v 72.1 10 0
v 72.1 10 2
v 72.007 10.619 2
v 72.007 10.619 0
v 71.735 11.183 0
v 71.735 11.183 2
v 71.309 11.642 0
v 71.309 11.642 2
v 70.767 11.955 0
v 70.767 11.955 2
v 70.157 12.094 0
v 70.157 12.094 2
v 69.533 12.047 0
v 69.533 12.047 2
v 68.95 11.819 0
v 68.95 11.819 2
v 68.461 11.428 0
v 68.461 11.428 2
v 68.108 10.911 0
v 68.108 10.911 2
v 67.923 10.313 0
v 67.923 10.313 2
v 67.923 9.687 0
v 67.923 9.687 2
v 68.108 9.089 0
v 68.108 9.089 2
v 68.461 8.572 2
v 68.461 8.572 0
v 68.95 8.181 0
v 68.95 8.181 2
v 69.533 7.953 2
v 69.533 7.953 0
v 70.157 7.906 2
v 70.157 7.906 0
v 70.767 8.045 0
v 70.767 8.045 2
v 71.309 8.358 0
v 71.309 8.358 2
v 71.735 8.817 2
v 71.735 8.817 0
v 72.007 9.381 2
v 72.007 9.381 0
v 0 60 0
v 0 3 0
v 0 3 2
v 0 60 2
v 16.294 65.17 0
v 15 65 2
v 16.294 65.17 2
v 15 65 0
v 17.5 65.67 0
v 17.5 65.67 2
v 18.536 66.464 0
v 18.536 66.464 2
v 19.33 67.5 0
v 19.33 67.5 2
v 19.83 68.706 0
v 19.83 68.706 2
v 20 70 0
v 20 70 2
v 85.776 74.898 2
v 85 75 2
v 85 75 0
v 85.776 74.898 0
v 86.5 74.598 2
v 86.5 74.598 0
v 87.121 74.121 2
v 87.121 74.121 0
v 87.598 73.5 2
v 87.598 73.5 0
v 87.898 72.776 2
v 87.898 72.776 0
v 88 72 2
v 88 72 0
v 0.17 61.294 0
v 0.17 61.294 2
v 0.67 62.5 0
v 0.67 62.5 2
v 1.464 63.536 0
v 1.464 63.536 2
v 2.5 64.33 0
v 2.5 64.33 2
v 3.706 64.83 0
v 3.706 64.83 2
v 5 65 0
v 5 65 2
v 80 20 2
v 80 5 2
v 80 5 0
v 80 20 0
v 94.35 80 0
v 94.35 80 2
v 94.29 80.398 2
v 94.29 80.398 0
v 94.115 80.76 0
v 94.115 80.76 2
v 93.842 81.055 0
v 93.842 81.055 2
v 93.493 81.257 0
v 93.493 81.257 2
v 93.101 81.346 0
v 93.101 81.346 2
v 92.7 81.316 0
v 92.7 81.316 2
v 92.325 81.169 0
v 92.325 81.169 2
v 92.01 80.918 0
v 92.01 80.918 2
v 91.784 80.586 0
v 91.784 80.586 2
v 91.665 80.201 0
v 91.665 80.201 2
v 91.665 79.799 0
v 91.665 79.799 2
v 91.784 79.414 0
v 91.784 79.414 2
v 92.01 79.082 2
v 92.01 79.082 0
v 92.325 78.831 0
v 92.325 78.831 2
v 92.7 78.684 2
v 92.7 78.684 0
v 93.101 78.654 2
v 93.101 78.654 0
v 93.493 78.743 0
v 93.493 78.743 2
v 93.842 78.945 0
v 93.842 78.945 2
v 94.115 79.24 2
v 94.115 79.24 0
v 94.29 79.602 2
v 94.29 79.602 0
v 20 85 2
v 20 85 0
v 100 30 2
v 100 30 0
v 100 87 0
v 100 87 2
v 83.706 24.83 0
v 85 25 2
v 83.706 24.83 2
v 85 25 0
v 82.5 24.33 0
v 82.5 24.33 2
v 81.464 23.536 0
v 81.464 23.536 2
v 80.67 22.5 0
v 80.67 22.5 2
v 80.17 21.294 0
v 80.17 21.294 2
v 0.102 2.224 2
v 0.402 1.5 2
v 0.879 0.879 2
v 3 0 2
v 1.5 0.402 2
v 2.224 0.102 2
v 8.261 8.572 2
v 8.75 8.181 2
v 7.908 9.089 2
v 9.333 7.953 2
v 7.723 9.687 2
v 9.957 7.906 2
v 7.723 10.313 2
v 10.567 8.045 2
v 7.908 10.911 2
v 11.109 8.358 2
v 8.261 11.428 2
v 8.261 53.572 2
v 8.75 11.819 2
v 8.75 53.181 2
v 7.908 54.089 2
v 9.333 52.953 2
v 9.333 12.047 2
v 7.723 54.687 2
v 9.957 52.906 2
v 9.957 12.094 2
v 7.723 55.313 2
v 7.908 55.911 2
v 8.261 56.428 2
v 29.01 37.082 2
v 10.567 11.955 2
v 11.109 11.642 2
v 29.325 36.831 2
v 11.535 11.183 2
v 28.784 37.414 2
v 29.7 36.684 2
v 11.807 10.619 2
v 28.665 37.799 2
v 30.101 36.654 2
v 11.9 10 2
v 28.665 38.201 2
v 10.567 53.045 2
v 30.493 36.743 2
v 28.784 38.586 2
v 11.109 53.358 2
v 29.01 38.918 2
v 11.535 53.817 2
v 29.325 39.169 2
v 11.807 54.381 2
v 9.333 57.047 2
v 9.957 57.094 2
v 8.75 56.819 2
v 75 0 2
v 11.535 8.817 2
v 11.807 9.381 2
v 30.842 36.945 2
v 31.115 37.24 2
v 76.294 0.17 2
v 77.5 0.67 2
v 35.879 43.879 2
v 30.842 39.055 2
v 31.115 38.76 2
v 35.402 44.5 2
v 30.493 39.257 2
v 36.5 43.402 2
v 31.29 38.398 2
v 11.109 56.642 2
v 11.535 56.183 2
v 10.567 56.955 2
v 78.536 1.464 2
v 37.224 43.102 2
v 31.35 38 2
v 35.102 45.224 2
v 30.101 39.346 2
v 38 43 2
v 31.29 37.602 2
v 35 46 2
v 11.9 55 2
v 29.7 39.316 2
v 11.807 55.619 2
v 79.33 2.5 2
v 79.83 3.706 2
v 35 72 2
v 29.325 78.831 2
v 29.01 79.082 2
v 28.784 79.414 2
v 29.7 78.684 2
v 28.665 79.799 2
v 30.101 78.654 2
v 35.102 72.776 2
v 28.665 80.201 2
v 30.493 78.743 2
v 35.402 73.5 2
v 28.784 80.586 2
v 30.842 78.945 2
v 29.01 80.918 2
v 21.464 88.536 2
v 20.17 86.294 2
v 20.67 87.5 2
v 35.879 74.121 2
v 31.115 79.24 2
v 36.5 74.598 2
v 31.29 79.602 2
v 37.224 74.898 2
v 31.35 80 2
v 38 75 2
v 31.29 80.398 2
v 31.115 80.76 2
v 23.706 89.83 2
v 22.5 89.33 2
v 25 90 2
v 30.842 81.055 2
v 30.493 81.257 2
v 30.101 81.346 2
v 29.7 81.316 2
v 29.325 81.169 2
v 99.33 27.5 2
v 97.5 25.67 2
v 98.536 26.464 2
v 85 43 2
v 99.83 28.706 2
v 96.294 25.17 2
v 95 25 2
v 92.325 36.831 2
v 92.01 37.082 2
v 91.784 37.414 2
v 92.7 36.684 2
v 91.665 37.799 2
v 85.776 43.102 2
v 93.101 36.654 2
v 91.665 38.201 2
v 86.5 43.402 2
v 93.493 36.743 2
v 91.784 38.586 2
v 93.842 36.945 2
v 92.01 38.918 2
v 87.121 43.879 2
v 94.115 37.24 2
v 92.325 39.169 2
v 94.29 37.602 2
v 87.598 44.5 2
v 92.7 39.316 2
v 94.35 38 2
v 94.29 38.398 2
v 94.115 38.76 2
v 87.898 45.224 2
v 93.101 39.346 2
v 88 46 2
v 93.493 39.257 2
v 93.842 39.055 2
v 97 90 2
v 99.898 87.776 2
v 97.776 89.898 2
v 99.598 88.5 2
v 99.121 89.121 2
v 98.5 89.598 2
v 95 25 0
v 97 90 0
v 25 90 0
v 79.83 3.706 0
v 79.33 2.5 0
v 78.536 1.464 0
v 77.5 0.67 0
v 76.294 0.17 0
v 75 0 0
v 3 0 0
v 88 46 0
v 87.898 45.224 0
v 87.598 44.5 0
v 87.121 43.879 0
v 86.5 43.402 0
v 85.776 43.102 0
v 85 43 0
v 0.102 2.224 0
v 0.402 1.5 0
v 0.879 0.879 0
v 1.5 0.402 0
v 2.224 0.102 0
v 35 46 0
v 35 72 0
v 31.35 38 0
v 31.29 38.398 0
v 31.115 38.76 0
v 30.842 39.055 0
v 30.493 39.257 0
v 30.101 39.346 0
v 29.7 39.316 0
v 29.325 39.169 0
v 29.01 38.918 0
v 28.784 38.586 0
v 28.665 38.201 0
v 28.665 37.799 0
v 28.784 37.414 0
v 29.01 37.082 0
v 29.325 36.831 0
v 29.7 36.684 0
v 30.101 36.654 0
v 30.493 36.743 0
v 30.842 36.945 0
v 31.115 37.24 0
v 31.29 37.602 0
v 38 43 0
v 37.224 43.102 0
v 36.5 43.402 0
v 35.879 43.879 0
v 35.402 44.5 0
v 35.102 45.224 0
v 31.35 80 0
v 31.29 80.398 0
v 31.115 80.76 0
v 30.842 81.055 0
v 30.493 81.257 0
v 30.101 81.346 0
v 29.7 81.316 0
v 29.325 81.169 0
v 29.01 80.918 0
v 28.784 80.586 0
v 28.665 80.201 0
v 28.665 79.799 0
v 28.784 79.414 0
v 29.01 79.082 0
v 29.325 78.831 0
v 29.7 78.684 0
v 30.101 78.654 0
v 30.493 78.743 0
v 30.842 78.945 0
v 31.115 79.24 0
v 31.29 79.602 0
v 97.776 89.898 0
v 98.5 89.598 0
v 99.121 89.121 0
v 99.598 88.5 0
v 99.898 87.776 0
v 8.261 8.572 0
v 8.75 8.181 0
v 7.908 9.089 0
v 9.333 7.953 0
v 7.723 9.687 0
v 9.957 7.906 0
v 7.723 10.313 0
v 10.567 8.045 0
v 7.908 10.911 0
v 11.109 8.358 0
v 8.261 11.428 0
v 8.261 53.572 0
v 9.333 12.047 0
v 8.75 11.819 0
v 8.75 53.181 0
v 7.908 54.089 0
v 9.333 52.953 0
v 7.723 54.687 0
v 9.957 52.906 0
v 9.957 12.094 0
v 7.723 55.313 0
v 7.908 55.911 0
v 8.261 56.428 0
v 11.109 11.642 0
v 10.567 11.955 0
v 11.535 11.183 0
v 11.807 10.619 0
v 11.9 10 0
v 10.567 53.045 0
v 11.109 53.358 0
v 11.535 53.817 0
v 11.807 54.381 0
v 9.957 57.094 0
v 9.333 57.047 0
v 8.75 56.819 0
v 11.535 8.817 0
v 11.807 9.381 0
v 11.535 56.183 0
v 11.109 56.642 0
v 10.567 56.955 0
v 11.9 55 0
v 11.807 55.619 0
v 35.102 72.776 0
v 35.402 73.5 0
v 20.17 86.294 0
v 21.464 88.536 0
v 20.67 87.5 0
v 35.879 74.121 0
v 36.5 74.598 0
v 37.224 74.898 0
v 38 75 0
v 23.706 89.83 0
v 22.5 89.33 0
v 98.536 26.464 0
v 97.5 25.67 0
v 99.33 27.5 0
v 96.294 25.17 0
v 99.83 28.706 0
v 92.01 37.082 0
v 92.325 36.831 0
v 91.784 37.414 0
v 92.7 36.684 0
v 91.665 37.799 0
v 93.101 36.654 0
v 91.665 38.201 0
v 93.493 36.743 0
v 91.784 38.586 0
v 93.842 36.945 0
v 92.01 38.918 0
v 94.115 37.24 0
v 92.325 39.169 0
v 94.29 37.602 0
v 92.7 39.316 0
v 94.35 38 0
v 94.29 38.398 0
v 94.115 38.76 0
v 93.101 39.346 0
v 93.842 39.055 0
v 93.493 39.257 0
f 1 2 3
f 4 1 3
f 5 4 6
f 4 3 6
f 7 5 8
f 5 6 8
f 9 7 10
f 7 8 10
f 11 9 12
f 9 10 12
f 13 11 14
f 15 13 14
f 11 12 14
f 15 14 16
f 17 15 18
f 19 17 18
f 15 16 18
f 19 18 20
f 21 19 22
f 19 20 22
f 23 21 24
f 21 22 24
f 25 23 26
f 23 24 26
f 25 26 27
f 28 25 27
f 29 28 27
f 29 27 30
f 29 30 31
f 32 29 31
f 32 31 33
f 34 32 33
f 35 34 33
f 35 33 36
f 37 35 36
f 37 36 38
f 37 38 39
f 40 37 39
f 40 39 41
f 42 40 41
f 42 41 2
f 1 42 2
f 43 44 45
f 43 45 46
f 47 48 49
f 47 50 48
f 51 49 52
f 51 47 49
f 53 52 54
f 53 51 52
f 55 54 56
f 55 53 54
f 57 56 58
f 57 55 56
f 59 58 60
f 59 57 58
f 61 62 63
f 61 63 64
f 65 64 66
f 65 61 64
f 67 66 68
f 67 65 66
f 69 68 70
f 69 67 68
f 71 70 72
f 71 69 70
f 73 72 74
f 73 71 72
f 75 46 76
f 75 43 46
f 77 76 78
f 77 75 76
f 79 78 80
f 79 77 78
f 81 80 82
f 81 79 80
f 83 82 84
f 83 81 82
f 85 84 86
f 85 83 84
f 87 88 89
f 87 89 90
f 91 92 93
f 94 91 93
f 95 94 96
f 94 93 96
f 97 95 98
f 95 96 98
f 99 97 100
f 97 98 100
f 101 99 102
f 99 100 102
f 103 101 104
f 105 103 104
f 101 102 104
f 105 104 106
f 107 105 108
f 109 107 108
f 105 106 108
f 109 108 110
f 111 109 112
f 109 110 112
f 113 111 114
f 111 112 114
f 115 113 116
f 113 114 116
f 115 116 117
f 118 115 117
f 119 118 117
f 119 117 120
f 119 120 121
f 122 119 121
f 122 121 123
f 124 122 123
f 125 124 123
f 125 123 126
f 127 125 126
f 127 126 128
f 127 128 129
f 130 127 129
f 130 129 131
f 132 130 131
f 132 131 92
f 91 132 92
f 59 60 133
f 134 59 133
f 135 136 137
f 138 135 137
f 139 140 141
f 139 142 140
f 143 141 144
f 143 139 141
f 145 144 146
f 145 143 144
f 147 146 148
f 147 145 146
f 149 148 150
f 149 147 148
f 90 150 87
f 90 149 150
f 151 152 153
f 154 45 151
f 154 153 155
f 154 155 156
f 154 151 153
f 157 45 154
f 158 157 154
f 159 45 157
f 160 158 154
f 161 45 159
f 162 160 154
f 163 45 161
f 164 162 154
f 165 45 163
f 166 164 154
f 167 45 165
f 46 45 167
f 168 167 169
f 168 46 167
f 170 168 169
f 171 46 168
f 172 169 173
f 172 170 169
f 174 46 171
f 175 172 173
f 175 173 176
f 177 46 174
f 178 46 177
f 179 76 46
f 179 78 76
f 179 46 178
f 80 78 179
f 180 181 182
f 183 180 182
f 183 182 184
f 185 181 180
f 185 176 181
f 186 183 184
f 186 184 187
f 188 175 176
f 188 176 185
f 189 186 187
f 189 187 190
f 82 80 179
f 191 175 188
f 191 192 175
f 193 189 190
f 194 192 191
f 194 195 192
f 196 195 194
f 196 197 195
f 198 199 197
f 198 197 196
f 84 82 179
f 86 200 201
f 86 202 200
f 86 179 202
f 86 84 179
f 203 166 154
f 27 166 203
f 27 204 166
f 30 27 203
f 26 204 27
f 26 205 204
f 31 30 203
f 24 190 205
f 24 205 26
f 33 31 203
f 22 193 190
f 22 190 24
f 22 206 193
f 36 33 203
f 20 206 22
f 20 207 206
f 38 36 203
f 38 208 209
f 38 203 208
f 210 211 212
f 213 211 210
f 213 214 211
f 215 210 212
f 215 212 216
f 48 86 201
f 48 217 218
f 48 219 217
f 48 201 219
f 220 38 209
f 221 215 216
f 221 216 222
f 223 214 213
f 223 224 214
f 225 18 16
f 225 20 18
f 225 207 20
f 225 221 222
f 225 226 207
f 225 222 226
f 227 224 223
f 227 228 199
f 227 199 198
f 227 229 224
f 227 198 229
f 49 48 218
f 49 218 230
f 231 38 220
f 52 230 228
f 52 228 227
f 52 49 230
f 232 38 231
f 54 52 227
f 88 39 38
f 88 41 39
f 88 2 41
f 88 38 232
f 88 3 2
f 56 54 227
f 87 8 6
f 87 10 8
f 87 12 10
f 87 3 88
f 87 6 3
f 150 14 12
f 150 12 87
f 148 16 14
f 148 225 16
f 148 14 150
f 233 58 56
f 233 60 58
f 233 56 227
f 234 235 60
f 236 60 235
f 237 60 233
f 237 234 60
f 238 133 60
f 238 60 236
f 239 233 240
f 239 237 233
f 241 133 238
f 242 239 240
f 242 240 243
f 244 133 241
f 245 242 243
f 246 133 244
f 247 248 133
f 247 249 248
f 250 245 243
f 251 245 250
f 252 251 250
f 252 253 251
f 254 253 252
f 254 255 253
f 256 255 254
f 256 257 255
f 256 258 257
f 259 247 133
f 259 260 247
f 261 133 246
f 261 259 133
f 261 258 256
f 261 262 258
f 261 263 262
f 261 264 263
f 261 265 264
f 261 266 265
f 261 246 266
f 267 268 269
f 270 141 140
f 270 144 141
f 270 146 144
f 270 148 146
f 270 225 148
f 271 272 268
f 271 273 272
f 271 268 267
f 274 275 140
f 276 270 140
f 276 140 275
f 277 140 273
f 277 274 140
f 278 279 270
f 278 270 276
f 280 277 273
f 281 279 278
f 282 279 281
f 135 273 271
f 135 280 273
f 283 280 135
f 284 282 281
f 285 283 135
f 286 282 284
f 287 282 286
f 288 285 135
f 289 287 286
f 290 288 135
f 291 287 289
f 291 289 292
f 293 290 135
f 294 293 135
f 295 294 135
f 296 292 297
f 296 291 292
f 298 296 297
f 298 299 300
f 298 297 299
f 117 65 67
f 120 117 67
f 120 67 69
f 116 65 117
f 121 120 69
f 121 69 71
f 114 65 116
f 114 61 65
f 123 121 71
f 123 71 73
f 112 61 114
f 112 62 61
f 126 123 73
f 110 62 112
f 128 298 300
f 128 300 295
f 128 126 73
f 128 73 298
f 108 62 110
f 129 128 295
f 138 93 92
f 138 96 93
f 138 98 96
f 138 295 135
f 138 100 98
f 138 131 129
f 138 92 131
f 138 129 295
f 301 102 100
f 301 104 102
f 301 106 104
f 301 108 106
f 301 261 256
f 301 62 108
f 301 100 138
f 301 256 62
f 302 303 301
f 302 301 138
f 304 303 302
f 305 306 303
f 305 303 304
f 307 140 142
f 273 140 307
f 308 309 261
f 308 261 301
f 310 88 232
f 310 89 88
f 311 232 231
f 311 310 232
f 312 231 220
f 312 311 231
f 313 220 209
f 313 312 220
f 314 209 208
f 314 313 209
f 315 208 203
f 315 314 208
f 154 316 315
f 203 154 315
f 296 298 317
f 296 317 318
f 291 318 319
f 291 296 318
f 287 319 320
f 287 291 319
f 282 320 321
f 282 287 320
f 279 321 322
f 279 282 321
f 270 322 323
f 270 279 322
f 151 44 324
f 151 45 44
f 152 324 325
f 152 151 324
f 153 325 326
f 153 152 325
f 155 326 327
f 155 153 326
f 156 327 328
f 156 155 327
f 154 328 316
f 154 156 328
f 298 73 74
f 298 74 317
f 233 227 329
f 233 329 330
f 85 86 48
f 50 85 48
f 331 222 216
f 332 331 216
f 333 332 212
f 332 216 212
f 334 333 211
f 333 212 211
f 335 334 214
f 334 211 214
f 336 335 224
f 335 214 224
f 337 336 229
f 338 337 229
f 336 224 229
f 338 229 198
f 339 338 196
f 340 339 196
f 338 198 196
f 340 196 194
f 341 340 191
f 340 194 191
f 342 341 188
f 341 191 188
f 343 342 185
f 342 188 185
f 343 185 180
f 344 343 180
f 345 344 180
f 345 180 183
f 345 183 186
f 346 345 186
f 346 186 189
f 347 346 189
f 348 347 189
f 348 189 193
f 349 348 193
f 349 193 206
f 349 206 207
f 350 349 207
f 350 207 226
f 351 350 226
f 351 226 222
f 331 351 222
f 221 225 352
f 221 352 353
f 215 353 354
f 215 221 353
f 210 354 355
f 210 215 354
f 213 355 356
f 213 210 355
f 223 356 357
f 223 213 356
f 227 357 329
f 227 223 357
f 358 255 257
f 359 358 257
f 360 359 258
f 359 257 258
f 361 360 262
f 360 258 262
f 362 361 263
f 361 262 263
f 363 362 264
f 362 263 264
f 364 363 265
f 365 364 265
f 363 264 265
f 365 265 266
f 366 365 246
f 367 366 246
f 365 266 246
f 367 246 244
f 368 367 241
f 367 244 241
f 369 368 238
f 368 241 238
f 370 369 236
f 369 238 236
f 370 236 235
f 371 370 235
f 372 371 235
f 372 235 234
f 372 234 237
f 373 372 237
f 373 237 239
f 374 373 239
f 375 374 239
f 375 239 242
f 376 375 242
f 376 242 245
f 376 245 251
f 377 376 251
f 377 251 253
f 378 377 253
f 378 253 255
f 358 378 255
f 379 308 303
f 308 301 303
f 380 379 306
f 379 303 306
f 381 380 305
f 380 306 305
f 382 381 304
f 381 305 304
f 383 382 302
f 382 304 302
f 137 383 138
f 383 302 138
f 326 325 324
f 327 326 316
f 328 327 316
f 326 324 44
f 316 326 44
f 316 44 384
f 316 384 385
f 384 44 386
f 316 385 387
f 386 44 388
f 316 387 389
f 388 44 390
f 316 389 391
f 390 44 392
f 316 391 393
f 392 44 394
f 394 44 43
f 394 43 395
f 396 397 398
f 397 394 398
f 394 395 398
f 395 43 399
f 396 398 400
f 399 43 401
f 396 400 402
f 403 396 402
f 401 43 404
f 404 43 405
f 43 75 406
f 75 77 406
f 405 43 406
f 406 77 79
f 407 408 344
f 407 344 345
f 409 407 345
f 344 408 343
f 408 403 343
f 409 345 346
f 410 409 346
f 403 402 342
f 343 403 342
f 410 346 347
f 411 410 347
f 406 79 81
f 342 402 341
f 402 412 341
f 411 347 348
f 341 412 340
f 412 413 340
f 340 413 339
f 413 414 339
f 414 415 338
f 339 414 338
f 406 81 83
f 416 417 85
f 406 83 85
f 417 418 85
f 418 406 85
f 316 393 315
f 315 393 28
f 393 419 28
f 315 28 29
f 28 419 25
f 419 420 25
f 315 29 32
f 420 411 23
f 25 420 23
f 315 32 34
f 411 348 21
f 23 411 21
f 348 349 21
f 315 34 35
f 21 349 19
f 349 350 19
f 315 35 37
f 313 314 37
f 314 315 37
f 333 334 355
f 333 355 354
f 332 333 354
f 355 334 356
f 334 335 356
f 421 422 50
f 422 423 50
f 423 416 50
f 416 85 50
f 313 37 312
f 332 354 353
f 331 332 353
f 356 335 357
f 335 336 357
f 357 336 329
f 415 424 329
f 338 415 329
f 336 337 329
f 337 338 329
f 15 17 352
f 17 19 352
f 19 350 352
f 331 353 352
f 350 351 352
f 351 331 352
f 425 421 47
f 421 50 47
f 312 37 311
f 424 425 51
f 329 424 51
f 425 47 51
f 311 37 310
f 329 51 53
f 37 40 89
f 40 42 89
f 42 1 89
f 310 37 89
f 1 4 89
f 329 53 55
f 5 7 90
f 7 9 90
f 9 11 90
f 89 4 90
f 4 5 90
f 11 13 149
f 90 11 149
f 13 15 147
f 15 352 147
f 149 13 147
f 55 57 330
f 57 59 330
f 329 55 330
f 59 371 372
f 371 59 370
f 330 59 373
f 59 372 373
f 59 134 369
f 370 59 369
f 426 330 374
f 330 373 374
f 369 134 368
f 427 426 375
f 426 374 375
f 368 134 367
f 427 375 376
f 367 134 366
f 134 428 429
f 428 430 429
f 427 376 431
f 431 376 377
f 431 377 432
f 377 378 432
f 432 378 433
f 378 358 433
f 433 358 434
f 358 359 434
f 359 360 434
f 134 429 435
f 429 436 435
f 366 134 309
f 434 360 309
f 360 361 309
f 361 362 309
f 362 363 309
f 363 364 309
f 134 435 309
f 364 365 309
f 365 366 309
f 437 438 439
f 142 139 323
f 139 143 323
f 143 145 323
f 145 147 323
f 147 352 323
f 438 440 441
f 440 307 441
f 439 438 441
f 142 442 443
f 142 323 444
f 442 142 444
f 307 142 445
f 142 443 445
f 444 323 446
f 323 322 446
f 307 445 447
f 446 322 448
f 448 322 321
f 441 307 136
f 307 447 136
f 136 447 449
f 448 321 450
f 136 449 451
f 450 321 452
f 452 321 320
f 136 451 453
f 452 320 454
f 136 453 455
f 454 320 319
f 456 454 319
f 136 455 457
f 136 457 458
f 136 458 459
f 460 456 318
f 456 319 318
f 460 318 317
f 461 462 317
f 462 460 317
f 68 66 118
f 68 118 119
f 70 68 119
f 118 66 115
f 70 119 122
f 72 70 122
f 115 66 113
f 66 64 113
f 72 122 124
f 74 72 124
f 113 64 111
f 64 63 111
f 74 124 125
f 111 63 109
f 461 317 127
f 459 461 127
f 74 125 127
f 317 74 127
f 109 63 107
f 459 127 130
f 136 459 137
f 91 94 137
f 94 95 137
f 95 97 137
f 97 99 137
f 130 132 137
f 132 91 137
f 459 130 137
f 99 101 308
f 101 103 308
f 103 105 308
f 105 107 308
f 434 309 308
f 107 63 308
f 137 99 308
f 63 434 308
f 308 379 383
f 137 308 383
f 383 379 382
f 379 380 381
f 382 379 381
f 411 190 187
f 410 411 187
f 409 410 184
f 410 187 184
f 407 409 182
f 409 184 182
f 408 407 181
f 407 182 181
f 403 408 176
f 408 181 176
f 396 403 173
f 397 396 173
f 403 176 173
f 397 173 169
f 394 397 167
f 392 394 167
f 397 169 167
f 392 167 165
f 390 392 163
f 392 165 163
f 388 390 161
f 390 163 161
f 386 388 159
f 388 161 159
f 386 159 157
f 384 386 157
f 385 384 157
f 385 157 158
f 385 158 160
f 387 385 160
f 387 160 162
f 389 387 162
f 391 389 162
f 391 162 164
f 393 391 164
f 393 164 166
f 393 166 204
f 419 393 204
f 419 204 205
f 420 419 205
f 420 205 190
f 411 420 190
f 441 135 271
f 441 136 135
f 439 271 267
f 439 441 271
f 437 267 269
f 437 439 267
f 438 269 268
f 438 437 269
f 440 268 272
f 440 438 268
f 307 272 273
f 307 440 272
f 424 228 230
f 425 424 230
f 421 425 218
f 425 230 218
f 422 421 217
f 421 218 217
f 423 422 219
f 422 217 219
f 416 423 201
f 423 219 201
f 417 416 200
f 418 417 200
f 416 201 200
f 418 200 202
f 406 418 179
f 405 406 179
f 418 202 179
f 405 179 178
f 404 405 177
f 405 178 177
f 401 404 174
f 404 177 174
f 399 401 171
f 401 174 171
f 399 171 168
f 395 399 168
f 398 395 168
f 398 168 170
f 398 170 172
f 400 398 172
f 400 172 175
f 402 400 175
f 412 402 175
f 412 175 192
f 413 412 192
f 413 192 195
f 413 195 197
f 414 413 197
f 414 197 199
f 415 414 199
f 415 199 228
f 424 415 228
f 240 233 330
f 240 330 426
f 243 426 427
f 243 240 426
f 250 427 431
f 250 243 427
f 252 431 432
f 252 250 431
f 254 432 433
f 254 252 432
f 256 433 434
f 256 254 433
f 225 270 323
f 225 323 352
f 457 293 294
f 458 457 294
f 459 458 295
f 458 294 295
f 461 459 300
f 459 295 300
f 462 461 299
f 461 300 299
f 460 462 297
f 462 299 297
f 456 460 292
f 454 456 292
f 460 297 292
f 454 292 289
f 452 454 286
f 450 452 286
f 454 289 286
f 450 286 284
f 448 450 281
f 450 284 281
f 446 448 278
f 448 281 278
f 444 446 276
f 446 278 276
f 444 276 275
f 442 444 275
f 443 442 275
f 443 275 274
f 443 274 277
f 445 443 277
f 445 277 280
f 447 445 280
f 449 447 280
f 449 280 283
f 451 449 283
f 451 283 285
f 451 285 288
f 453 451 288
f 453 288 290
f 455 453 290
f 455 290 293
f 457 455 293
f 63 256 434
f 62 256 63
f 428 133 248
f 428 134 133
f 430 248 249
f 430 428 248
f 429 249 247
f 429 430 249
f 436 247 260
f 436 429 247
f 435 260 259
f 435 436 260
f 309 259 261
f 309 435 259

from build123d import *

# Parameters (mm, degrees)
SKETCH_1_W          = 100
SKETCH_1_H          = 90
EXTRUDE_1_DEPTH     = 2
SKETCH_2_R          = 2.1
CUT_EXTRUDE_1_DEPTH = 135.551105532
SKETCH_3_R          = 1.35
CUT_EXTRUDE_2_DEPTH = 135.551105532
FILLET_1_R          = 3
SKETCH_5_W          = 20
SKETCH_5_H          = 25
CUT_EXTRUDE_3_DEPTH = 10
FILLET_2_R          = 5


with BuildPart() as part:
    # 草图1 → 凸台-拉伸1 (new body)
    with BuildSketch(Plane.XY):
        with Locations((50, 45)):
            Rectangle(SKETCH_1_W, SKETCH_1_H)
    extrude(amount=EXTRUDE_1_DEPTH)

    # 草图2 → 切除-拉伸1 (cut, through all)
    with BuildSketch(Plane.XY.offset(2)):
        with Locations((9.8, 10)):
            Circle(SKETCH_2_R)
        with Locations((70, 10)):
            Circle(SKETCH_2_R)
        with Locations((9.8, 55)):
            Circle(SKETCH_2_R)
    extrude(amount=-CUT_EXTRUDE_1_DEPTH, mode=Mode.SUBTRACT)

    # 草图3 → 切除-拉伸2 (cut, through all)
    with BuildSketch(Plane.XY.offset(2)):
        with Locations((30, 80)):
            Circle(SKETCH_3_R)
        with Locations((93, 80)):
            Circle(SKETCH_3_R)
        with Locations((93, 38)):
            Circle(SKETCH_3_R)
        with Locations((30, 38)):
            Circle(SKETCH_3_R)
        with BuildLine():
            Line((38, 75), (85, 75))
            ThreePointArc((85, 75), (87.121320344, 74.121320344), (88, 72))
            Line((88, 72), (88, 46))
            ThreePointArc((88, 46), (87.121320344, 43.878679656), (85, 43))
            Line((85, 43), (38, 43))
            ThreePointArc((38, 43), (35.878679656, 43.878679656), (35, 46))
            Line((35, 46), (35, 72))
            ThreePointArc((35, 72), (35.878679656, 74.121320344), (38, 75))
        make_face()
    extrude(amount=-CUT_EXTRUDE_2_DEPTH, mode=Mode.SUBTRACT)

    # 圆角1
    fillet_1_edges = [part.edges().sort_by_distance(p)[0] for p in [
        (0, 90, 1),
        (100, 90, 1),
        (100, 0, 1),
        (0, 0, 1),
    ]]
    fillet(fillet_1_edges, radius=FILLET_1_R)

    # 草图5 → 切除-拉伸3 (cut)
    with BuildSketch(Plane.XY.offset(2)):
        with Locations((10, 77.5)):
            Rectangle(SKETCH_5_W, SKETCH_5_H)
        with Locations((90, 12.5)):
            Rectangle(SKETCH_5_W, SKETCH_5_H)
    extrude(amount=-CUT_EXTRUDE_3_DEPTH, mode=Mode.SUBTRACT)

    # 圆角2
    fillet_2_edges = [part.edges().sort_by_distance(p)[0] for p in [
        (0, 65, 1),
        (20, 90, 1),
        (20, 65, 1),
        (100, 25, 1),
        (80, 0, 1),
        (80, 25, 1),
    ]]
    fillet(fillet_2_edges, radius=FILLET_2_R)


solid = part.part
